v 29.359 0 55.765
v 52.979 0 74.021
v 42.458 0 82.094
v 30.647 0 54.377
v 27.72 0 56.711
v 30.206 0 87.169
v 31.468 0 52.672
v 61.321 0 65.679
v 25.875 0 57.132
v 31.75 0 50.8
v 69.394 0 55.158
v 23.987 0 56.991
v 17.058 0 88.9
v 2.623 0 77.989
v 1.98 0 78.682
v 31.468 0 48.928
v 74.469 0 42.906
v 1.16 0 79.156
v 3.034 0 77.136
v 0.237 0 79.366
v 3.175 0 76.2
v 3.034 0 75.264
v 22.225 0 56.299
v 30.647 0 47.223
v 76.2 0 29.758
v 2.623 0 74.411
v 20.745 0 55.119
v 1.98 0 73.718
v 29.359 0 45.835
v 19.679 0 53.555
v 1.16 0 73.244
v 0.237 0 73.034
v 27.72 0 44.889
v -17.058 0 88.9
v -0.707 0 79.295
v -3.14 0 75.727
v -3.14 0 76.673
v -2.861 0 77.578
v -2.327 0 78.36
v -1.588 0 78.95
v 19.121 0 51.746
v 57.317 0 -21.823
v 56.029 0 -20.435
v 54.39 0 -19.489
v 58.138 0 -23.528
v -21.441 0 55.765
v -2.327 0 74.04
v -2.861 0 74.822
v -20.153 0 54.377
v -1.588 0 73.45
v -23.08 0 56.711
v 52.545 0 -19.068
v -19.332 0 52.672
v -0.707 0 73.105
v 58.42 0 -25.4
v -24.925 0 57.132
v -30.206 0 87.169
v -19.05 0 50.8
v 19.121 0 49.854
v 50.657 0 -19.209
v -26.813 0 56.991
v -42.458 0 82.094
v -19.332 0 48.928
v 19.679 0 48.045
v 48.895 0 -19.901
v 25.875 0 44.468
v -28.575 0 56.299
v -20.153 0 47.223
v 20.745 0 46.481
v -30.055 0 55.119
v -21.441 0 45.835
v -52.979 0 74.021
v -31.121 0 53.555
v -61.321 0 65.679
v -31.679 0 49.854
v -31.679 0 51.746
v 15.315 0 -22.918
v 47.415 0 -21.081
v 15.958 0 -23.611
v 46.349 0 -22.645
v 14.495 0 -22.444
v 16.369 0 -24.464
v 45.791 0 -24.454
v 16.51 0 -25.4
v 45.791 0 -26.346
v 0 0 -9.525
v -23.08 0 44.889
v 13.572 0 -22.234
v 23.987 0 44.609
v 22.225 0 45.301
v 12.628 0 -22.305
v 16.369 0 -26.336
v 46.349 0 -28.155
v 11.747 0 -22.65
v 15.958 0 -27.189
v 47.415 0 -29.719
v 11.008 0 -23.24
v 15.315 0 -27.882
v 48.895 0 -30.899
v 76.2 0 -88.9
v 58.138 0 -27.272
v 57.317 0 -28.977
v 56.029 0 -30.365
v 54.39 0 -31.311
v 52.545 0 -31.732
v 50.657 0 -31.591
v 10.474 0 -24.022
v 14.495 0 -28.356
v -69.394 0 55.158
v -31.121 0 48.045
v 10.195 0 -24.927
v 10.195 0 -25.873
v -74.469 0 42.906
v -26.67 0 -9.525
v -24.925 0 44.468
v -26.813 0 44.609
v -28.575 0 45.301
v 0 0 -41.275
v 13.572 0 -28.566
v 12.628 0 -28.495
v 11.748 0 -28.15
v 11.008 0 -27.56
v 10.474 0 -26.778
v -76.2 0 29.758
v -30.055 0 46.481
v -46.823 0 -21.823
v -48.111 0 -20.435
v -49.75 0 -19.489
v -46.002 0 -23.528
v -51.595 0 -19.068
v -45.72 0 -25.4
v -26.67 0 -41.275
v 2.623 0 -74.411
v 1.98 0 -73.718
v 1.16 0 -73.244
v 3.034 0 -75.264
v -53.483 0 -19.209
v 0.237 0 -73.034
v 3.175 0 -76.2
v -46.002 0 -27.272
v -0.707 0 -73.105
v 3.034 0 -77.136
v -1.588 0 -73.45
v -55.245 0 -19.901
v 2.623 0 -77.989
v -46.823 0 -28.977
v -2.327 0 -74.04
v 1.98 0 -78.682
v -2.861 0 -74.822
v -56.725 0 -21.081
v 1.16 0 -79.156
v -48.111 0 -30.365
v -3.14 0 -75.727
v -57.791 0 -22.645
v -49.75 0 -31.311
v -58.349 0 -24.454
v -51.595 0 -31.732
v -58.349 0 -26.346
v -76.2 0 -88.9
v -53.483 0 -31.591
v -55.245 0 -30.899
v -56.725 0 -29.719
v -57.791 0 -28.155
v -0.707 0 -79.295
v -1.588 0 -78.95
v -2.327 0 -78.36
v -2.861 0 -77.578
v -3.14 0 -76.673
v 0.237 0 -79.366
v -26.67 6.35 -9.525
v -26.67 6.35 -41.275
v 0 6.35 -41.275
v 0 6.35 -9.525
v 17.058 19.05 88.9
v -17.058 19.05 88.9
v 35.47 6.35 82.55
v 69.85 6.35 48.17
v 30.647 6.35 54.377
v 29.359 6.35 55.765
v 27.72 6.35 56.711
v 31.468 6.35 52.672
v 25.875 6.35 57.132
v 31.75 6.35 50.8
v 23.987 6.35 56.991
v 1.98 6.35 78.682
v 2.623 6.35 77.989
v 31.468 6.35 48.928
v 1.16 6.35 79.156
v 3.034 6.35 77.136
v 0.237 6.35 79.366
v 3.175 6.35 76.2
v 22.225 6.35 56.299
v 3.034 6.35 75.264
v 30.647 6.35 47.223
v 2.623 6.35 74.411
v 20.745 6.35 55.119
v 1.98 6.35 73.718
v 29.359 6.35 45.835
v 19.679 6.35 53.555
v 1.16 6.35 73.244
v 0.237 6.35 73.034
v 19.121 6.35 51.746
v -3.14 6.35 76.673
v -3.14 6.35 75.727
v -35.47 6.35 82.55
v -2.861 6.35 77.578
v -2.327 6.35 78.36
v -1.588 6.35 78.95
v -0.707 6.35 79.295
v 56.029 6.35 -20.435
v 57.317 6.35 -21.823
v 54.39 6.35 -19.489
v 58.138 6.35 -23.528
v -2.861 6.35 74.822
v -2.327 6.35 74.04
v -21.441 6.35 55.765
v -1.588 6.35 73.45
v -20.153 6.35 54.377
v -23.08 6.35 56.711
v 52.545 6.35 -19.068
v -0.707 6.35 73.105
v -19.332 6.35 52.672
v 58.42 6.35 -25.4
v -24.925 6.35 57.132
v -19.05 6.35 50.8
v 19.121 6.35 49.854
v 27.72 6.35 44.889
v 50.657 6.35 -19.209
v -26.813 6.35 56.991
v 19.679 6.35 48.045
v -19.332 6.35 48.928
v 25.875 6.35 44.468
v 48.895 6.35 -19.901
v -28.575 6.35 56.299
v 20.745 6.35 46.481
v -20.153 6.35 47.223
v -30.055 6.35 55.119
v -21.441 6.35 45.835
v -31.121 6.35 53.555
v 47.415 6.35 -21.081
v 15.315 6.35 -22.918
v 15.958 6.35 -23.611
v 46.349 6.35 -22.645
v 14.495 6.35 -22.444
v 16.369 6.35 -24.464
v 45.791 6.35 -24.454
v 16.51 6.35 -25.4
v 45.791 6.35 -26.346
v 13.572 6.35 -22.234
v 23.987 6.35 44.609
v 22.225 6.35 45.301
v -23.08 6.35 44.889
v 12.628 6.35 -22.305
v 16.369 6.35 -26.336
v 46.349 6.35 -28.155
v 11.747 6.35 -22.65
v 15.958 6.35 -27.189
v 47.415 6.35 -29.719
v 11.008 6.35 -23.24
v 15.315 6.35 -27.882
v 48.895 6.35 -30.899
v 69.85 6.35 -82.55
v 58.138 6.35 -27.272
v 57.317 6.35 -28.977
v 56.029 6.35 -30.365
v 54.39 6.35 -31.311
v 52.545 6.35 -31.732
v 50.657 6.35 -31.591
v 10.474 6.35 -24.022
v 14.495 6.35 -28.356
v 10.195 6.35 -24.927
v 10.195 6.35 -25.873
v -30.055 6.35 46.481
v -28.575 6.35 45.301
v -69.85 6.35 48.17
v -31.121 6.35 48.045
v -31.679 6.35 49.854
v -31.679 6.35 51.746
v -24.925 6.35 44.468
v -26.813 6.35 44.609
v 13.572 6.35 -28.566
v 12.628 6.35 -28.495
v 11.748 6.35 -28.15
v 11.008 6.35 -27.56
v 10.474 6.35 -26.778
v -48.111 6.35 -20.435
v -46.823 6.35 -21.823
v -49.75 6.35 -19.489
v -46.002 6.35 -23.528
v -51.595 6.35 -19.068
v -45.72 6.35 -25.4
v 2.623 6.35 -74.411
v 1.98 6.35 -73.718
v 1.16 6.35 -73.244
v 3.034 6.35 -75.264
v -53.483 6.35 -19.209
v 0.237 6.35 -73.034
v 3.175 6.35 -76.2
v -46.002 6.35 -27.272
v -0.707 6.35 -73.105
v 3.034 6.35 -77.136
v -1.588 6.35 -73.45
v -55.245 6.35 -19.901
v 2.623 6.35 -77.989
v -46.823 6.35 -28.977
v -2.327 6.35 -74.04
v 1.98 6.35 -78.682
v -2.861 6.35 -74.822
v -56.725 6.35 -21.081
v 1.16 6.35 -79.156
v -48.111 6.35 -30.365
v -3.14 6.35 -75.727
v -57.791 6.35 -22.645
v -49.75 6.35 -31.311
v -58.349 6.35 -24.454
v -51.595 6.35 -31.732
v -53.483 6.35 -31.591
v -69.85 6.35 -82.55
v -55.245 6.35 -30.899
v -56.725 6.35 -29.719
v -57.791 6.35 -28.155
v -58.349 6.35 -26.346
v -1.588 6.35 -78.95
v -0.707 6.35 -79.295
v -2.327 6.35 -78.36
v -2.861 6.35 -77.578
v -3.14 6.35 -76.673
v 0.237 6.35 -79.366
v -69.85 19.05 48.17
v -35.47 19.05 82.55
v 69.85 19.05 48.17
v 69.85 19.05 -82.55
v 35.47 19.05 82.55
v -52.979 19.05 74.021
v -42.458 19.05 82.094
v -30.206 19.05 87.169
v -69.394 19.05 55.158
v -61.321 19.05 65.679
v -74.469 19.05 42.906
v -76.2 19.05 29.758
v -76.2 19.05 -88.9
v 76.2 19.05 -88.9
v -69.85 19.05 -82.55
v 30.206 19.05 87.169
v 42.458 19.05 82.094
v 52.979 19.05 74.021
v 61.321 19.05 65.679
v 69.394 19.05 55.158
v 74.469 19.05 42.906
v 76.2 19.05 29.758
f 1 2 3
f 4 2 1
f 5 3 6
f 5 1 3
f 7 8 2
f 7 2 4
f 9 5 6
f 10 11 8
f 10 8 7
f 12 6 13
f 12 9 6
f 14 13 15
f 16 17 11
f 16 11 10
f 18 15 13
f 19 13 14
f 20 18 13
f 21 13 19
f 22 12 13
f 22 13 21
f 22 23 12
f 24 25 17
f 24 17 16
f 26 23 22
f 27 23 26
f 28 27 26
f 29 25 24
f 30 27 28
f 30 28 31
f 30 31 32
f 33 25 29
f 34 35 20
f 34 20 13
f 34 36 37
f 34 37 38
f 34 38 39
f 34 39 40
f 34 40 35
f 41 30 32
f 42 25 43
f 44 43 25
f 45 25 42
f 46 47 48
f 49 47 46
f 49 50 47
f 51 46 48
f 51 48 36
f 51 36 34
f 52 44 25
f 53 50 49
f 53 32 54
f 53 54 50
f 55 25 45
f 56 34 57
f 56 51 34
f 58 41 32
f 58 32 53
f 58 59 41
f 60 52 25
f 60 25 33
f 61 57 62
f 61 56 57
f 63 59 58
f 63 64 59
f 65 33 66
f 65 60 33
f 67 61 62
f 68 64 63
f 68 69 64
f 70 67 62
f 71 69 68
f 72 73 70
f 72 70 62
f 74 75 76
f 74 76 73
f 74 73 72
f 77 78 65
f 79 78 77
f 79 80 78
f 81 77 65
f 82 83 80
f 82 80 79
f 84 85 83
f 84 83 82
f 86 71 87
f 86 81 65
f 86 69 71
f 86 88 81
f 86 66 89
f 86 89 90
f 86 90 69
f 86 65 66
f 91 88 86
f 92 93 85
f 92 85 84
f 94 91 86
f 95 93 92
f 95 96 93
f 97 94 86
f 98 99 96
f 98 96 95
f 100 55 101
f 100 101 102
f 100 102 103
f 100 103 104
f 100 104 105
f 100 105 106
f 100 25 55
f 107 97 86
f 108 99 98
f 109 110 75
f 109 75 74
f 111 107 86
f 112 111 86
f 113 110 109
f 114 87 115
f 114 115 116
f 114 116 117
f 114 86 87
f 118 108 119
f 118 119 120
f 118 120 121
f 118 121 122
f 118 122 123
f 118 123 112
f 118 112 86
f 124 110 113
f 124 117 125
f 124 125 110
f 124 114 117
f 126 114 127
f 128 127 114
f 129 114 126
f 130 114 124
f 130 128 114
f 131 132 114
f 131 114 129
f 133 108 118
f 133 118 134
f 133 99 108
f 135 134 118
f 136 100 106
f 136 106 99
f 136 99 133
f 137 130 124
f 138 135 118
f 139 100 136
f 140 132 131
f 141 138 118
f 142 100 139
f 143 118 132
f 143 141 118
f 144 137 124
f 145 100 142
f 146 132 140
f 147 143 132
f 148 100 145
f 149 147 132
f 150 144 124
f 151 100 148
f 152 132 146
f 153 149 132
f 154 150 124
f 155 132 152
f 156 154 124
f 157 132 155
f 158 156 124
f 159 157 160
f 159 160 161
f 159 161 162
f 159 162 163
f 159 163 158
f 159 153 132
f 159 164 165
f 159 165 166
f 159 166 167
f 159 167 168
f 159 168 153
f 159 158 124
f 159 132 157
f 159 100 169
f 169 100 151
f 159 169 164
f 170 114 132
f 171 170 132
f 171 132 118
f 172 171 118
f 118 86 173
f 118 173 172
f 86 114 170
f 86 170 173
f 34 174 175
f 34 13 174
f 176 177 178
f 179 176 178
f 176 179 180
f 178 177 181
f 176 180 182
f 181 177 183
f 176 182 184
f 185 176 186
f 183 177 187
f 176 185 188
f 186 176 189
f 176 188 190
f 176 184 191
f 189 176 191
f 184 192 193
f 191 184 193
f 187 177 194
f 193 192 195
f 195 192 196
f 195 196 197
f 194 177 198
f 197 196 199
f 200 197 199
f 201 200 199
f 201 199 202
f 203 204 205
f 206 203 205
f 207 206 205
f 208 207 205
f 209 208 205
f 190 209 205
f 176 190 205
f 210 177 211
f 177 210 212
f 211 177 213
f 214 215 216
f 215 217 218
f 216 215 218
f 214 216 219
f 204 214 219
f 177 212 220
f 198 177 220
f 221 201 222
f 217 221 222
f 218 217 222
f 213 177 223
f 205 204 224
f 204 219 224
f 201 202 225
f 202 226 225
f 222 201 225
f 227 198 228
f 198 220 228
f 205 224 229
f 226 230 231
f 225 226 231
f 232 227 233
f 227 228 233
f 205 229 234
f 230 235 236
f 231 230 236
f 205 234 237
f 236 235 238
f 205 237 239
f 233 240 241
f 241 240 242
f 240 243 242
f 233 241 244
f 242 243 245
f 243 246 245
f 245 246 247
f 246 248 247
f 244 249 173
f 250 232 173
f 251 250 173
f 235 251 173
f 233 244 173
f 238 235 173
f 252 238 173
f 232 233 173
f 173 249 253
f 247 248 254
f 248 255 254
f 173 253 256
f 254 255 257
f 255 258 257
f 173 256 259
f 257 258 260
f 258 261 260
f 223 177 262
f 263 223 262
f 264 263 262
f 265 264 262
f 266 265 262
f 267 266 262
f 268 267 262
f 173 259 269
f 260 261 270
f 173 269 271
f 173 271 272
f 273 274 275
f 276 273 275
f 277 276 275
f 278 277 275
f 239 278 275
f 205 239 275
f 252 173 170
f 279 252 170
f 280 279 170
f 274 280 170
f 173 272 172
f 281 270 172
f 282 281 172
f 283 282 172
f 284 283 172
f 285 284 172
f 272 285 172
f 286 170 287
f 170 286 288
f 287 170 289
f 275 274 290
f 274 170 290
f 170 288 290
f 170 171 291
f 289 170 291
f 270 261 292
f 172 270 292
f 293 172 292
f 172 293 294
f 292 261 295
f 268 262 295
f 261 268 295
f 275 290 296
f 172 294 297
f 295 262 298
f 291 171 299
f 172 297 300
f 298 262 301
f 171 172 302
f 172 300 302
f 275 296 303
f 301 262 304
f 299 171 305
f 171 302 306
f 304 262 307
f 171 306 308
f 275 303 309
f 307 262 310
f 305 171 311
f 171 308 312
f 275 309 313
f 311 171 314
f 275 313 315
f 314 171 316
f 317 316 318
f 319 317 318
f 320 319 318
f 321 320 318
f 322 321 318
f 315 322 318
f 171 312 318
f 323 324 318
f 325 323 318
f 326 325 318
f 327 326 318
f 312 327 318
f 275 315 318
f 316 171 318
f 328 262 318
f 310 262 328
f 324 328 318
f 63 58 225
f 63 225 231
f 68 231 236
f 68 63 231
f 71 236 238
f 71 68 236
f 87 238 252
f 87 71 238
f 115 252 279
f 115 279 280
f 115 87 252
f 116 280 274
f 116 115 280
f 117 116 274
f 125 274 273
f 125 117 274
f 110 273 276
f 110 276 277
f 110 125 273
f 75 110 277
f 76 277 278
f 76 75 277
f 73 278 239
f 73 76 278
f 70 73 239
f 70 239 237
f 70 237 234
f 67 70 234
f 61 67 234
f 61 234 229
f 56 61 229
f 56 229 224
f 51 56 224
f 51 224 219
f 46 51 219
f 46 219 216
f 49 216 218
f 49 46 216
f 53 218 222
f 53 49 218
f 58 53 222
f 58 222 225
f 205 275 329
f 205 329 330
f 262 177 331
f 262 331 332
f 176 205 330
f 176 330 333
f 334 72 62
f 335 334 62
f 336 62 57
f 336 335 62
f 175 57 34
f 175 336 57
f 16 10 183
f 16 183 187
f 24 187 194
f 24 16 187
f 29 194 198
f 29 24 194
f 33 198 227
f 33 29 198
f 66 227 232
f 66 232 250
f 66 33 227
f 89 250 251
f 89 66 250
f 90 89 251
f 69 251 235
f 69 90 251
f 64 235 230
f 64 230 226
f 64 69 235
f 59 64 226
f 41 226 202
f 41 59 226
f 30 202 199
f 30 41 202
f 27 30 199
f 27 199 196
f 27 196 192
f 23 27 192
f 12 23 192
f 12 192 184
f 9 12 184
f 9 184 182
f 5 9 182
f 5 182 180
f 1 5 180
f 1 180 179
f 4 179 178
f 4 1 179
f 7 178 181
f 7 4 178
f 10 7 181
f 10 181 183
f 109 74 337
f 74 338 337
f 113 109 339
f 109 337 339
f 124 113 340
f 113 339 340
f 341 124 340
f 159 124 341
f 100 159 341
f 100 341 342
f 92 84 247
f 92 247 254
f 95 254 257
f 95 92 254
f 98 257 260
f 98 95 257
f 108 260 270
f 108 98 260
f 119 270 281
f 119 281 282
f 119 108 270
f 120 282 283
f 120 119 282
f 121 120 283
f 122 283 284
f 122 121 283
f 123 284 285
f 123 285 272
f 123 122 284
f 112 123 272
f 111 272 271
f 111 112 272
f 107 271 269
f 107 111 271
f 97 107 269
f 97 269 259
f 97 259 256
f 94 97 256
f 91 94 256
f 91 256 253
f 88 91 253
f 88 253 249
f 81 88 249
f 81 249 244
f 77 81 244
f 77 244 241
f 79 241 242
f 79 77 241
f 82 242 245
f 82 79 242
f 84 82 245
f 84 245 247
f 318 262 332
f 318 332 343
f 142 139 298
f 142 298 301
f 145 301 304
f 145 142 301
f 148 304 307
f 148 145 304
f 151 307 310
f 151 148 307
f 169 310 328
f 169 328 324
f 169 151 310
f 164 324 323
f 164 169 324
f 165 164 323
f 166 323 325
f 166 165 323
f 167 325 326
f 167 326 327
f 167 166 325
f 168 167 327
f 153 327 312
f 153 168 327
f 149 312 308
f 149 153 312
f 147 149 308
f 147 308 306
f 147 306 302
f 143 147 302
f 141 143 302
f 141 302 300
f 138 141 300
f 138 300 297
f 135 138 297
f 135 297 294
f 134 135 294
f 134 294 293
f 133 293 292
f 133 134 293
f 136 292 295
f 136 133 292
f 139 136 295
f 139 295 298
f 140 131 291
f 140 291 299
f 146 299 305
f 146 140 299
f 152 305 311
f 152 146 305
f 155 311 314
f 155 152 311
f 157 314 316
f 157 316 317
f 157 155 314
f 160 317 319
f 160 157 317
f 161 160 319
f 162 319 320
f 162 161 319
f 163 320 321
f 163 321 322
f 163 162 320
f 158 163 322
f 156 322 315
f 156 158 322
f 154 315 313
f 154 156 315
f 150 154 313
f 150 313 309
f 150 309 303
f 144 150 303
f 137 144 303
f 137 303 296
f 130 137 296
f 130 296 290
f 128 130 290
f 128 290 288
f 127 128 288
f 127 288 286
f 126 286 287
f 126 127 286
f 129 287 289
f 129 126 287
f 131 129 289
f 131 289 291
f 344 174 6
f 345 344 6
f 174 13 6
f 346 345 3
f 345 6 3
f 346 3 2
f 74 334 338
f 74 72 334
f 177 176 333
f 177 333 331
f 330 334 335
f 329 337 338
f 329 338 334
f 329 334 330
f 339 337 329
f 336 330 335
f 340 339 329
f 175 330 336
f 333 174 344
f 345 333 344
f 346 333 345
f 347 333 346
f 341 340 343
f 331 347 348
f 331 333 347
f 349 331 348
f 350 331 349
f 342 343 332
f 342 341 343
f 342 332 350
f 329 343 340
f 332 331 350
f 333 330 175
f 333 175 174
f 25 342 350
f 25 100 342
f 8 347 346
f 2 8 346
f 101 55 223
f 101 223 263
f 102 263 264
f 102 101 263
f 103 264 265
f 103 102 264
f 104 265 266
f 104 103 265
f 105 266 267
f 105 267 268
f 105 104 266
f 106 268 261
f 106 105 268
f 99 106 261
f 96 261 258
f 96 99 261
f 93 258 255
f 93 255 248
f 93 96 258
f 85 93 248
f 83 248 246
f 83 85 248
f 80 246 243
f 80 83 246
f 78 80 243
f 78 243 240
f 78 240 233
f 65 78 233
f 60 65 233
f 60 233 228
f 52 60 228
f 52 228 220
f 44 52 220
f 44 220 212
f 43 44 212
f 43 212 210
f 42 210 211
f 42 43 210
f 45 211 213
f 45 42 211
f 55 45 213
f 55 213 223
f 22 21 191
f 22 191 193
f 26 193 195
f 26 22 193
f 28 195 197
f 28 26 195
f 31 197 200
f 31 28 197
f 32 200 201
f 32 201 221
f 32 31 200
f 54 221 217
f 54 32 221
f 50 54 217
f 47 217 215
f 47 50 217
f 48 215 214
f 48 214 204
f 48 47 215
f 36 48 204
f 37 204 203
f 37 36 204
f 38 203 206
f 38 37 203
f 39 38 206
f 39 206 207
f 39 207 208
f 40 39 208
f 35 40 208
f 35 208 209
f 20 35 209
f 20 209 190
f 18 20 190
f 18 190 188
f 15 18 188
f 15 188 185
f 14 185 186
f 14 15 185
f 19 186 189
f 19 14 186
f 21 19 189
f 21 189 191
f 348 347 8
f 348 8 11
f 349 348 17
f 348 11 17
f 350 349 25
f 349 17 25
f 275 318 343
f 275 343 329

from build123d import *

# Parameters (mm, degrees)
SKETCH1_R           = 6.35
SKETCH1_R_2         = 3.175
SKETCH1_W           = 26.67
SKETCH1_H           = 31.75
BOSS_EXTRUDE1_DEPTH = 6.35
BOSS_EXTRUDE2_DEPTH = 19.05
FILLET1_R           = 50.8


with BuildPart() as part:
    # Sketch1 → Boss-Extrude1 (new body)
    with BuildSketch(Plane(origin=(0, 0, 0), x_dir=(1, 0, 0), z_dir=(0, 1, 0))):
        Polygon((-76.2, 88.9), (76.2, 88.9), (76.2, -50.8), (38.1, -88.9), (-38.1, -88.9), (-76.2, -50.8), align=None)
        with Locations((52.07, 25.4)):
            Circle(SKETCH1_R, mode=Mode.SUBTRACT)
        with Locations((-25.4, -50.8)):
            Circle(SKETCH1_R, mode=Mode.SUBTRACT)
        with Locations((25.4, -50.8)):
            Circle(SKETCH1_R, mode=Mode.SUBTRACT)
        with Locations((0, -76.2)):
            Circle(SKETCH1_R_2, mode=Mode.SUBTRACT)
        with Locations((0, 76.2)):
            Circle(SKETCH1_R_2, mode=Mode.SUBTRACT)
        with Locations((-52.07, 25.4)):
            Circle(SKETCH1_R, mode=Mode.SUBTRACT)
        with Locations((13.335, 25.4)):
            Circle(SKETCH1_R_2, mode=Mode.SUBTRACT)
        with Locations((-13.335, 25.4)):
            Rectangle(SKETCH1_W, SKETCH1_H, mode=Mode.SUBTRACT)
    extrude(amount=BOSS_EXTRUDE1_DEPTH)

    # Sketch2 → Boss-Extrude2 (add)
    with BuildSketch(Plane(origin=(0, 0, 0), x_dir=(1, 0, 0), z_dir=(0, 1, 0))):
        Polygon((-76.2, 88.9), (-76.2, -50.8), (-38.1, -88.9), (38.1, -88.9), (76.2, -50.8), (76.2, 88.9), align=None)
        Polygon((-69.85, 82.55), (-69.85, -48.169743879), (-35.469743879, -82.55), (35.469743879, -82.55), (69.85, -48.169743879), (69.85, 82.55), align=None, mode=Mode.SUBTRACT)
    extrude(amount=BOSS_EXTRUDE2_DEPTH)

    # Fillet1
    fillet1_edges = [part.edges().sort_by_distance(p)[0] for p in [
        (76.2, 9.525, 50.8),
        (38.1, 9.525, 88.9),
        (-38.1, 9.525, 88.9),
        (-76.2, 9.525, 50.8),
    ]]
    fillet(fillet1_edges, radius=FILLET1_R)


solid = part.part
